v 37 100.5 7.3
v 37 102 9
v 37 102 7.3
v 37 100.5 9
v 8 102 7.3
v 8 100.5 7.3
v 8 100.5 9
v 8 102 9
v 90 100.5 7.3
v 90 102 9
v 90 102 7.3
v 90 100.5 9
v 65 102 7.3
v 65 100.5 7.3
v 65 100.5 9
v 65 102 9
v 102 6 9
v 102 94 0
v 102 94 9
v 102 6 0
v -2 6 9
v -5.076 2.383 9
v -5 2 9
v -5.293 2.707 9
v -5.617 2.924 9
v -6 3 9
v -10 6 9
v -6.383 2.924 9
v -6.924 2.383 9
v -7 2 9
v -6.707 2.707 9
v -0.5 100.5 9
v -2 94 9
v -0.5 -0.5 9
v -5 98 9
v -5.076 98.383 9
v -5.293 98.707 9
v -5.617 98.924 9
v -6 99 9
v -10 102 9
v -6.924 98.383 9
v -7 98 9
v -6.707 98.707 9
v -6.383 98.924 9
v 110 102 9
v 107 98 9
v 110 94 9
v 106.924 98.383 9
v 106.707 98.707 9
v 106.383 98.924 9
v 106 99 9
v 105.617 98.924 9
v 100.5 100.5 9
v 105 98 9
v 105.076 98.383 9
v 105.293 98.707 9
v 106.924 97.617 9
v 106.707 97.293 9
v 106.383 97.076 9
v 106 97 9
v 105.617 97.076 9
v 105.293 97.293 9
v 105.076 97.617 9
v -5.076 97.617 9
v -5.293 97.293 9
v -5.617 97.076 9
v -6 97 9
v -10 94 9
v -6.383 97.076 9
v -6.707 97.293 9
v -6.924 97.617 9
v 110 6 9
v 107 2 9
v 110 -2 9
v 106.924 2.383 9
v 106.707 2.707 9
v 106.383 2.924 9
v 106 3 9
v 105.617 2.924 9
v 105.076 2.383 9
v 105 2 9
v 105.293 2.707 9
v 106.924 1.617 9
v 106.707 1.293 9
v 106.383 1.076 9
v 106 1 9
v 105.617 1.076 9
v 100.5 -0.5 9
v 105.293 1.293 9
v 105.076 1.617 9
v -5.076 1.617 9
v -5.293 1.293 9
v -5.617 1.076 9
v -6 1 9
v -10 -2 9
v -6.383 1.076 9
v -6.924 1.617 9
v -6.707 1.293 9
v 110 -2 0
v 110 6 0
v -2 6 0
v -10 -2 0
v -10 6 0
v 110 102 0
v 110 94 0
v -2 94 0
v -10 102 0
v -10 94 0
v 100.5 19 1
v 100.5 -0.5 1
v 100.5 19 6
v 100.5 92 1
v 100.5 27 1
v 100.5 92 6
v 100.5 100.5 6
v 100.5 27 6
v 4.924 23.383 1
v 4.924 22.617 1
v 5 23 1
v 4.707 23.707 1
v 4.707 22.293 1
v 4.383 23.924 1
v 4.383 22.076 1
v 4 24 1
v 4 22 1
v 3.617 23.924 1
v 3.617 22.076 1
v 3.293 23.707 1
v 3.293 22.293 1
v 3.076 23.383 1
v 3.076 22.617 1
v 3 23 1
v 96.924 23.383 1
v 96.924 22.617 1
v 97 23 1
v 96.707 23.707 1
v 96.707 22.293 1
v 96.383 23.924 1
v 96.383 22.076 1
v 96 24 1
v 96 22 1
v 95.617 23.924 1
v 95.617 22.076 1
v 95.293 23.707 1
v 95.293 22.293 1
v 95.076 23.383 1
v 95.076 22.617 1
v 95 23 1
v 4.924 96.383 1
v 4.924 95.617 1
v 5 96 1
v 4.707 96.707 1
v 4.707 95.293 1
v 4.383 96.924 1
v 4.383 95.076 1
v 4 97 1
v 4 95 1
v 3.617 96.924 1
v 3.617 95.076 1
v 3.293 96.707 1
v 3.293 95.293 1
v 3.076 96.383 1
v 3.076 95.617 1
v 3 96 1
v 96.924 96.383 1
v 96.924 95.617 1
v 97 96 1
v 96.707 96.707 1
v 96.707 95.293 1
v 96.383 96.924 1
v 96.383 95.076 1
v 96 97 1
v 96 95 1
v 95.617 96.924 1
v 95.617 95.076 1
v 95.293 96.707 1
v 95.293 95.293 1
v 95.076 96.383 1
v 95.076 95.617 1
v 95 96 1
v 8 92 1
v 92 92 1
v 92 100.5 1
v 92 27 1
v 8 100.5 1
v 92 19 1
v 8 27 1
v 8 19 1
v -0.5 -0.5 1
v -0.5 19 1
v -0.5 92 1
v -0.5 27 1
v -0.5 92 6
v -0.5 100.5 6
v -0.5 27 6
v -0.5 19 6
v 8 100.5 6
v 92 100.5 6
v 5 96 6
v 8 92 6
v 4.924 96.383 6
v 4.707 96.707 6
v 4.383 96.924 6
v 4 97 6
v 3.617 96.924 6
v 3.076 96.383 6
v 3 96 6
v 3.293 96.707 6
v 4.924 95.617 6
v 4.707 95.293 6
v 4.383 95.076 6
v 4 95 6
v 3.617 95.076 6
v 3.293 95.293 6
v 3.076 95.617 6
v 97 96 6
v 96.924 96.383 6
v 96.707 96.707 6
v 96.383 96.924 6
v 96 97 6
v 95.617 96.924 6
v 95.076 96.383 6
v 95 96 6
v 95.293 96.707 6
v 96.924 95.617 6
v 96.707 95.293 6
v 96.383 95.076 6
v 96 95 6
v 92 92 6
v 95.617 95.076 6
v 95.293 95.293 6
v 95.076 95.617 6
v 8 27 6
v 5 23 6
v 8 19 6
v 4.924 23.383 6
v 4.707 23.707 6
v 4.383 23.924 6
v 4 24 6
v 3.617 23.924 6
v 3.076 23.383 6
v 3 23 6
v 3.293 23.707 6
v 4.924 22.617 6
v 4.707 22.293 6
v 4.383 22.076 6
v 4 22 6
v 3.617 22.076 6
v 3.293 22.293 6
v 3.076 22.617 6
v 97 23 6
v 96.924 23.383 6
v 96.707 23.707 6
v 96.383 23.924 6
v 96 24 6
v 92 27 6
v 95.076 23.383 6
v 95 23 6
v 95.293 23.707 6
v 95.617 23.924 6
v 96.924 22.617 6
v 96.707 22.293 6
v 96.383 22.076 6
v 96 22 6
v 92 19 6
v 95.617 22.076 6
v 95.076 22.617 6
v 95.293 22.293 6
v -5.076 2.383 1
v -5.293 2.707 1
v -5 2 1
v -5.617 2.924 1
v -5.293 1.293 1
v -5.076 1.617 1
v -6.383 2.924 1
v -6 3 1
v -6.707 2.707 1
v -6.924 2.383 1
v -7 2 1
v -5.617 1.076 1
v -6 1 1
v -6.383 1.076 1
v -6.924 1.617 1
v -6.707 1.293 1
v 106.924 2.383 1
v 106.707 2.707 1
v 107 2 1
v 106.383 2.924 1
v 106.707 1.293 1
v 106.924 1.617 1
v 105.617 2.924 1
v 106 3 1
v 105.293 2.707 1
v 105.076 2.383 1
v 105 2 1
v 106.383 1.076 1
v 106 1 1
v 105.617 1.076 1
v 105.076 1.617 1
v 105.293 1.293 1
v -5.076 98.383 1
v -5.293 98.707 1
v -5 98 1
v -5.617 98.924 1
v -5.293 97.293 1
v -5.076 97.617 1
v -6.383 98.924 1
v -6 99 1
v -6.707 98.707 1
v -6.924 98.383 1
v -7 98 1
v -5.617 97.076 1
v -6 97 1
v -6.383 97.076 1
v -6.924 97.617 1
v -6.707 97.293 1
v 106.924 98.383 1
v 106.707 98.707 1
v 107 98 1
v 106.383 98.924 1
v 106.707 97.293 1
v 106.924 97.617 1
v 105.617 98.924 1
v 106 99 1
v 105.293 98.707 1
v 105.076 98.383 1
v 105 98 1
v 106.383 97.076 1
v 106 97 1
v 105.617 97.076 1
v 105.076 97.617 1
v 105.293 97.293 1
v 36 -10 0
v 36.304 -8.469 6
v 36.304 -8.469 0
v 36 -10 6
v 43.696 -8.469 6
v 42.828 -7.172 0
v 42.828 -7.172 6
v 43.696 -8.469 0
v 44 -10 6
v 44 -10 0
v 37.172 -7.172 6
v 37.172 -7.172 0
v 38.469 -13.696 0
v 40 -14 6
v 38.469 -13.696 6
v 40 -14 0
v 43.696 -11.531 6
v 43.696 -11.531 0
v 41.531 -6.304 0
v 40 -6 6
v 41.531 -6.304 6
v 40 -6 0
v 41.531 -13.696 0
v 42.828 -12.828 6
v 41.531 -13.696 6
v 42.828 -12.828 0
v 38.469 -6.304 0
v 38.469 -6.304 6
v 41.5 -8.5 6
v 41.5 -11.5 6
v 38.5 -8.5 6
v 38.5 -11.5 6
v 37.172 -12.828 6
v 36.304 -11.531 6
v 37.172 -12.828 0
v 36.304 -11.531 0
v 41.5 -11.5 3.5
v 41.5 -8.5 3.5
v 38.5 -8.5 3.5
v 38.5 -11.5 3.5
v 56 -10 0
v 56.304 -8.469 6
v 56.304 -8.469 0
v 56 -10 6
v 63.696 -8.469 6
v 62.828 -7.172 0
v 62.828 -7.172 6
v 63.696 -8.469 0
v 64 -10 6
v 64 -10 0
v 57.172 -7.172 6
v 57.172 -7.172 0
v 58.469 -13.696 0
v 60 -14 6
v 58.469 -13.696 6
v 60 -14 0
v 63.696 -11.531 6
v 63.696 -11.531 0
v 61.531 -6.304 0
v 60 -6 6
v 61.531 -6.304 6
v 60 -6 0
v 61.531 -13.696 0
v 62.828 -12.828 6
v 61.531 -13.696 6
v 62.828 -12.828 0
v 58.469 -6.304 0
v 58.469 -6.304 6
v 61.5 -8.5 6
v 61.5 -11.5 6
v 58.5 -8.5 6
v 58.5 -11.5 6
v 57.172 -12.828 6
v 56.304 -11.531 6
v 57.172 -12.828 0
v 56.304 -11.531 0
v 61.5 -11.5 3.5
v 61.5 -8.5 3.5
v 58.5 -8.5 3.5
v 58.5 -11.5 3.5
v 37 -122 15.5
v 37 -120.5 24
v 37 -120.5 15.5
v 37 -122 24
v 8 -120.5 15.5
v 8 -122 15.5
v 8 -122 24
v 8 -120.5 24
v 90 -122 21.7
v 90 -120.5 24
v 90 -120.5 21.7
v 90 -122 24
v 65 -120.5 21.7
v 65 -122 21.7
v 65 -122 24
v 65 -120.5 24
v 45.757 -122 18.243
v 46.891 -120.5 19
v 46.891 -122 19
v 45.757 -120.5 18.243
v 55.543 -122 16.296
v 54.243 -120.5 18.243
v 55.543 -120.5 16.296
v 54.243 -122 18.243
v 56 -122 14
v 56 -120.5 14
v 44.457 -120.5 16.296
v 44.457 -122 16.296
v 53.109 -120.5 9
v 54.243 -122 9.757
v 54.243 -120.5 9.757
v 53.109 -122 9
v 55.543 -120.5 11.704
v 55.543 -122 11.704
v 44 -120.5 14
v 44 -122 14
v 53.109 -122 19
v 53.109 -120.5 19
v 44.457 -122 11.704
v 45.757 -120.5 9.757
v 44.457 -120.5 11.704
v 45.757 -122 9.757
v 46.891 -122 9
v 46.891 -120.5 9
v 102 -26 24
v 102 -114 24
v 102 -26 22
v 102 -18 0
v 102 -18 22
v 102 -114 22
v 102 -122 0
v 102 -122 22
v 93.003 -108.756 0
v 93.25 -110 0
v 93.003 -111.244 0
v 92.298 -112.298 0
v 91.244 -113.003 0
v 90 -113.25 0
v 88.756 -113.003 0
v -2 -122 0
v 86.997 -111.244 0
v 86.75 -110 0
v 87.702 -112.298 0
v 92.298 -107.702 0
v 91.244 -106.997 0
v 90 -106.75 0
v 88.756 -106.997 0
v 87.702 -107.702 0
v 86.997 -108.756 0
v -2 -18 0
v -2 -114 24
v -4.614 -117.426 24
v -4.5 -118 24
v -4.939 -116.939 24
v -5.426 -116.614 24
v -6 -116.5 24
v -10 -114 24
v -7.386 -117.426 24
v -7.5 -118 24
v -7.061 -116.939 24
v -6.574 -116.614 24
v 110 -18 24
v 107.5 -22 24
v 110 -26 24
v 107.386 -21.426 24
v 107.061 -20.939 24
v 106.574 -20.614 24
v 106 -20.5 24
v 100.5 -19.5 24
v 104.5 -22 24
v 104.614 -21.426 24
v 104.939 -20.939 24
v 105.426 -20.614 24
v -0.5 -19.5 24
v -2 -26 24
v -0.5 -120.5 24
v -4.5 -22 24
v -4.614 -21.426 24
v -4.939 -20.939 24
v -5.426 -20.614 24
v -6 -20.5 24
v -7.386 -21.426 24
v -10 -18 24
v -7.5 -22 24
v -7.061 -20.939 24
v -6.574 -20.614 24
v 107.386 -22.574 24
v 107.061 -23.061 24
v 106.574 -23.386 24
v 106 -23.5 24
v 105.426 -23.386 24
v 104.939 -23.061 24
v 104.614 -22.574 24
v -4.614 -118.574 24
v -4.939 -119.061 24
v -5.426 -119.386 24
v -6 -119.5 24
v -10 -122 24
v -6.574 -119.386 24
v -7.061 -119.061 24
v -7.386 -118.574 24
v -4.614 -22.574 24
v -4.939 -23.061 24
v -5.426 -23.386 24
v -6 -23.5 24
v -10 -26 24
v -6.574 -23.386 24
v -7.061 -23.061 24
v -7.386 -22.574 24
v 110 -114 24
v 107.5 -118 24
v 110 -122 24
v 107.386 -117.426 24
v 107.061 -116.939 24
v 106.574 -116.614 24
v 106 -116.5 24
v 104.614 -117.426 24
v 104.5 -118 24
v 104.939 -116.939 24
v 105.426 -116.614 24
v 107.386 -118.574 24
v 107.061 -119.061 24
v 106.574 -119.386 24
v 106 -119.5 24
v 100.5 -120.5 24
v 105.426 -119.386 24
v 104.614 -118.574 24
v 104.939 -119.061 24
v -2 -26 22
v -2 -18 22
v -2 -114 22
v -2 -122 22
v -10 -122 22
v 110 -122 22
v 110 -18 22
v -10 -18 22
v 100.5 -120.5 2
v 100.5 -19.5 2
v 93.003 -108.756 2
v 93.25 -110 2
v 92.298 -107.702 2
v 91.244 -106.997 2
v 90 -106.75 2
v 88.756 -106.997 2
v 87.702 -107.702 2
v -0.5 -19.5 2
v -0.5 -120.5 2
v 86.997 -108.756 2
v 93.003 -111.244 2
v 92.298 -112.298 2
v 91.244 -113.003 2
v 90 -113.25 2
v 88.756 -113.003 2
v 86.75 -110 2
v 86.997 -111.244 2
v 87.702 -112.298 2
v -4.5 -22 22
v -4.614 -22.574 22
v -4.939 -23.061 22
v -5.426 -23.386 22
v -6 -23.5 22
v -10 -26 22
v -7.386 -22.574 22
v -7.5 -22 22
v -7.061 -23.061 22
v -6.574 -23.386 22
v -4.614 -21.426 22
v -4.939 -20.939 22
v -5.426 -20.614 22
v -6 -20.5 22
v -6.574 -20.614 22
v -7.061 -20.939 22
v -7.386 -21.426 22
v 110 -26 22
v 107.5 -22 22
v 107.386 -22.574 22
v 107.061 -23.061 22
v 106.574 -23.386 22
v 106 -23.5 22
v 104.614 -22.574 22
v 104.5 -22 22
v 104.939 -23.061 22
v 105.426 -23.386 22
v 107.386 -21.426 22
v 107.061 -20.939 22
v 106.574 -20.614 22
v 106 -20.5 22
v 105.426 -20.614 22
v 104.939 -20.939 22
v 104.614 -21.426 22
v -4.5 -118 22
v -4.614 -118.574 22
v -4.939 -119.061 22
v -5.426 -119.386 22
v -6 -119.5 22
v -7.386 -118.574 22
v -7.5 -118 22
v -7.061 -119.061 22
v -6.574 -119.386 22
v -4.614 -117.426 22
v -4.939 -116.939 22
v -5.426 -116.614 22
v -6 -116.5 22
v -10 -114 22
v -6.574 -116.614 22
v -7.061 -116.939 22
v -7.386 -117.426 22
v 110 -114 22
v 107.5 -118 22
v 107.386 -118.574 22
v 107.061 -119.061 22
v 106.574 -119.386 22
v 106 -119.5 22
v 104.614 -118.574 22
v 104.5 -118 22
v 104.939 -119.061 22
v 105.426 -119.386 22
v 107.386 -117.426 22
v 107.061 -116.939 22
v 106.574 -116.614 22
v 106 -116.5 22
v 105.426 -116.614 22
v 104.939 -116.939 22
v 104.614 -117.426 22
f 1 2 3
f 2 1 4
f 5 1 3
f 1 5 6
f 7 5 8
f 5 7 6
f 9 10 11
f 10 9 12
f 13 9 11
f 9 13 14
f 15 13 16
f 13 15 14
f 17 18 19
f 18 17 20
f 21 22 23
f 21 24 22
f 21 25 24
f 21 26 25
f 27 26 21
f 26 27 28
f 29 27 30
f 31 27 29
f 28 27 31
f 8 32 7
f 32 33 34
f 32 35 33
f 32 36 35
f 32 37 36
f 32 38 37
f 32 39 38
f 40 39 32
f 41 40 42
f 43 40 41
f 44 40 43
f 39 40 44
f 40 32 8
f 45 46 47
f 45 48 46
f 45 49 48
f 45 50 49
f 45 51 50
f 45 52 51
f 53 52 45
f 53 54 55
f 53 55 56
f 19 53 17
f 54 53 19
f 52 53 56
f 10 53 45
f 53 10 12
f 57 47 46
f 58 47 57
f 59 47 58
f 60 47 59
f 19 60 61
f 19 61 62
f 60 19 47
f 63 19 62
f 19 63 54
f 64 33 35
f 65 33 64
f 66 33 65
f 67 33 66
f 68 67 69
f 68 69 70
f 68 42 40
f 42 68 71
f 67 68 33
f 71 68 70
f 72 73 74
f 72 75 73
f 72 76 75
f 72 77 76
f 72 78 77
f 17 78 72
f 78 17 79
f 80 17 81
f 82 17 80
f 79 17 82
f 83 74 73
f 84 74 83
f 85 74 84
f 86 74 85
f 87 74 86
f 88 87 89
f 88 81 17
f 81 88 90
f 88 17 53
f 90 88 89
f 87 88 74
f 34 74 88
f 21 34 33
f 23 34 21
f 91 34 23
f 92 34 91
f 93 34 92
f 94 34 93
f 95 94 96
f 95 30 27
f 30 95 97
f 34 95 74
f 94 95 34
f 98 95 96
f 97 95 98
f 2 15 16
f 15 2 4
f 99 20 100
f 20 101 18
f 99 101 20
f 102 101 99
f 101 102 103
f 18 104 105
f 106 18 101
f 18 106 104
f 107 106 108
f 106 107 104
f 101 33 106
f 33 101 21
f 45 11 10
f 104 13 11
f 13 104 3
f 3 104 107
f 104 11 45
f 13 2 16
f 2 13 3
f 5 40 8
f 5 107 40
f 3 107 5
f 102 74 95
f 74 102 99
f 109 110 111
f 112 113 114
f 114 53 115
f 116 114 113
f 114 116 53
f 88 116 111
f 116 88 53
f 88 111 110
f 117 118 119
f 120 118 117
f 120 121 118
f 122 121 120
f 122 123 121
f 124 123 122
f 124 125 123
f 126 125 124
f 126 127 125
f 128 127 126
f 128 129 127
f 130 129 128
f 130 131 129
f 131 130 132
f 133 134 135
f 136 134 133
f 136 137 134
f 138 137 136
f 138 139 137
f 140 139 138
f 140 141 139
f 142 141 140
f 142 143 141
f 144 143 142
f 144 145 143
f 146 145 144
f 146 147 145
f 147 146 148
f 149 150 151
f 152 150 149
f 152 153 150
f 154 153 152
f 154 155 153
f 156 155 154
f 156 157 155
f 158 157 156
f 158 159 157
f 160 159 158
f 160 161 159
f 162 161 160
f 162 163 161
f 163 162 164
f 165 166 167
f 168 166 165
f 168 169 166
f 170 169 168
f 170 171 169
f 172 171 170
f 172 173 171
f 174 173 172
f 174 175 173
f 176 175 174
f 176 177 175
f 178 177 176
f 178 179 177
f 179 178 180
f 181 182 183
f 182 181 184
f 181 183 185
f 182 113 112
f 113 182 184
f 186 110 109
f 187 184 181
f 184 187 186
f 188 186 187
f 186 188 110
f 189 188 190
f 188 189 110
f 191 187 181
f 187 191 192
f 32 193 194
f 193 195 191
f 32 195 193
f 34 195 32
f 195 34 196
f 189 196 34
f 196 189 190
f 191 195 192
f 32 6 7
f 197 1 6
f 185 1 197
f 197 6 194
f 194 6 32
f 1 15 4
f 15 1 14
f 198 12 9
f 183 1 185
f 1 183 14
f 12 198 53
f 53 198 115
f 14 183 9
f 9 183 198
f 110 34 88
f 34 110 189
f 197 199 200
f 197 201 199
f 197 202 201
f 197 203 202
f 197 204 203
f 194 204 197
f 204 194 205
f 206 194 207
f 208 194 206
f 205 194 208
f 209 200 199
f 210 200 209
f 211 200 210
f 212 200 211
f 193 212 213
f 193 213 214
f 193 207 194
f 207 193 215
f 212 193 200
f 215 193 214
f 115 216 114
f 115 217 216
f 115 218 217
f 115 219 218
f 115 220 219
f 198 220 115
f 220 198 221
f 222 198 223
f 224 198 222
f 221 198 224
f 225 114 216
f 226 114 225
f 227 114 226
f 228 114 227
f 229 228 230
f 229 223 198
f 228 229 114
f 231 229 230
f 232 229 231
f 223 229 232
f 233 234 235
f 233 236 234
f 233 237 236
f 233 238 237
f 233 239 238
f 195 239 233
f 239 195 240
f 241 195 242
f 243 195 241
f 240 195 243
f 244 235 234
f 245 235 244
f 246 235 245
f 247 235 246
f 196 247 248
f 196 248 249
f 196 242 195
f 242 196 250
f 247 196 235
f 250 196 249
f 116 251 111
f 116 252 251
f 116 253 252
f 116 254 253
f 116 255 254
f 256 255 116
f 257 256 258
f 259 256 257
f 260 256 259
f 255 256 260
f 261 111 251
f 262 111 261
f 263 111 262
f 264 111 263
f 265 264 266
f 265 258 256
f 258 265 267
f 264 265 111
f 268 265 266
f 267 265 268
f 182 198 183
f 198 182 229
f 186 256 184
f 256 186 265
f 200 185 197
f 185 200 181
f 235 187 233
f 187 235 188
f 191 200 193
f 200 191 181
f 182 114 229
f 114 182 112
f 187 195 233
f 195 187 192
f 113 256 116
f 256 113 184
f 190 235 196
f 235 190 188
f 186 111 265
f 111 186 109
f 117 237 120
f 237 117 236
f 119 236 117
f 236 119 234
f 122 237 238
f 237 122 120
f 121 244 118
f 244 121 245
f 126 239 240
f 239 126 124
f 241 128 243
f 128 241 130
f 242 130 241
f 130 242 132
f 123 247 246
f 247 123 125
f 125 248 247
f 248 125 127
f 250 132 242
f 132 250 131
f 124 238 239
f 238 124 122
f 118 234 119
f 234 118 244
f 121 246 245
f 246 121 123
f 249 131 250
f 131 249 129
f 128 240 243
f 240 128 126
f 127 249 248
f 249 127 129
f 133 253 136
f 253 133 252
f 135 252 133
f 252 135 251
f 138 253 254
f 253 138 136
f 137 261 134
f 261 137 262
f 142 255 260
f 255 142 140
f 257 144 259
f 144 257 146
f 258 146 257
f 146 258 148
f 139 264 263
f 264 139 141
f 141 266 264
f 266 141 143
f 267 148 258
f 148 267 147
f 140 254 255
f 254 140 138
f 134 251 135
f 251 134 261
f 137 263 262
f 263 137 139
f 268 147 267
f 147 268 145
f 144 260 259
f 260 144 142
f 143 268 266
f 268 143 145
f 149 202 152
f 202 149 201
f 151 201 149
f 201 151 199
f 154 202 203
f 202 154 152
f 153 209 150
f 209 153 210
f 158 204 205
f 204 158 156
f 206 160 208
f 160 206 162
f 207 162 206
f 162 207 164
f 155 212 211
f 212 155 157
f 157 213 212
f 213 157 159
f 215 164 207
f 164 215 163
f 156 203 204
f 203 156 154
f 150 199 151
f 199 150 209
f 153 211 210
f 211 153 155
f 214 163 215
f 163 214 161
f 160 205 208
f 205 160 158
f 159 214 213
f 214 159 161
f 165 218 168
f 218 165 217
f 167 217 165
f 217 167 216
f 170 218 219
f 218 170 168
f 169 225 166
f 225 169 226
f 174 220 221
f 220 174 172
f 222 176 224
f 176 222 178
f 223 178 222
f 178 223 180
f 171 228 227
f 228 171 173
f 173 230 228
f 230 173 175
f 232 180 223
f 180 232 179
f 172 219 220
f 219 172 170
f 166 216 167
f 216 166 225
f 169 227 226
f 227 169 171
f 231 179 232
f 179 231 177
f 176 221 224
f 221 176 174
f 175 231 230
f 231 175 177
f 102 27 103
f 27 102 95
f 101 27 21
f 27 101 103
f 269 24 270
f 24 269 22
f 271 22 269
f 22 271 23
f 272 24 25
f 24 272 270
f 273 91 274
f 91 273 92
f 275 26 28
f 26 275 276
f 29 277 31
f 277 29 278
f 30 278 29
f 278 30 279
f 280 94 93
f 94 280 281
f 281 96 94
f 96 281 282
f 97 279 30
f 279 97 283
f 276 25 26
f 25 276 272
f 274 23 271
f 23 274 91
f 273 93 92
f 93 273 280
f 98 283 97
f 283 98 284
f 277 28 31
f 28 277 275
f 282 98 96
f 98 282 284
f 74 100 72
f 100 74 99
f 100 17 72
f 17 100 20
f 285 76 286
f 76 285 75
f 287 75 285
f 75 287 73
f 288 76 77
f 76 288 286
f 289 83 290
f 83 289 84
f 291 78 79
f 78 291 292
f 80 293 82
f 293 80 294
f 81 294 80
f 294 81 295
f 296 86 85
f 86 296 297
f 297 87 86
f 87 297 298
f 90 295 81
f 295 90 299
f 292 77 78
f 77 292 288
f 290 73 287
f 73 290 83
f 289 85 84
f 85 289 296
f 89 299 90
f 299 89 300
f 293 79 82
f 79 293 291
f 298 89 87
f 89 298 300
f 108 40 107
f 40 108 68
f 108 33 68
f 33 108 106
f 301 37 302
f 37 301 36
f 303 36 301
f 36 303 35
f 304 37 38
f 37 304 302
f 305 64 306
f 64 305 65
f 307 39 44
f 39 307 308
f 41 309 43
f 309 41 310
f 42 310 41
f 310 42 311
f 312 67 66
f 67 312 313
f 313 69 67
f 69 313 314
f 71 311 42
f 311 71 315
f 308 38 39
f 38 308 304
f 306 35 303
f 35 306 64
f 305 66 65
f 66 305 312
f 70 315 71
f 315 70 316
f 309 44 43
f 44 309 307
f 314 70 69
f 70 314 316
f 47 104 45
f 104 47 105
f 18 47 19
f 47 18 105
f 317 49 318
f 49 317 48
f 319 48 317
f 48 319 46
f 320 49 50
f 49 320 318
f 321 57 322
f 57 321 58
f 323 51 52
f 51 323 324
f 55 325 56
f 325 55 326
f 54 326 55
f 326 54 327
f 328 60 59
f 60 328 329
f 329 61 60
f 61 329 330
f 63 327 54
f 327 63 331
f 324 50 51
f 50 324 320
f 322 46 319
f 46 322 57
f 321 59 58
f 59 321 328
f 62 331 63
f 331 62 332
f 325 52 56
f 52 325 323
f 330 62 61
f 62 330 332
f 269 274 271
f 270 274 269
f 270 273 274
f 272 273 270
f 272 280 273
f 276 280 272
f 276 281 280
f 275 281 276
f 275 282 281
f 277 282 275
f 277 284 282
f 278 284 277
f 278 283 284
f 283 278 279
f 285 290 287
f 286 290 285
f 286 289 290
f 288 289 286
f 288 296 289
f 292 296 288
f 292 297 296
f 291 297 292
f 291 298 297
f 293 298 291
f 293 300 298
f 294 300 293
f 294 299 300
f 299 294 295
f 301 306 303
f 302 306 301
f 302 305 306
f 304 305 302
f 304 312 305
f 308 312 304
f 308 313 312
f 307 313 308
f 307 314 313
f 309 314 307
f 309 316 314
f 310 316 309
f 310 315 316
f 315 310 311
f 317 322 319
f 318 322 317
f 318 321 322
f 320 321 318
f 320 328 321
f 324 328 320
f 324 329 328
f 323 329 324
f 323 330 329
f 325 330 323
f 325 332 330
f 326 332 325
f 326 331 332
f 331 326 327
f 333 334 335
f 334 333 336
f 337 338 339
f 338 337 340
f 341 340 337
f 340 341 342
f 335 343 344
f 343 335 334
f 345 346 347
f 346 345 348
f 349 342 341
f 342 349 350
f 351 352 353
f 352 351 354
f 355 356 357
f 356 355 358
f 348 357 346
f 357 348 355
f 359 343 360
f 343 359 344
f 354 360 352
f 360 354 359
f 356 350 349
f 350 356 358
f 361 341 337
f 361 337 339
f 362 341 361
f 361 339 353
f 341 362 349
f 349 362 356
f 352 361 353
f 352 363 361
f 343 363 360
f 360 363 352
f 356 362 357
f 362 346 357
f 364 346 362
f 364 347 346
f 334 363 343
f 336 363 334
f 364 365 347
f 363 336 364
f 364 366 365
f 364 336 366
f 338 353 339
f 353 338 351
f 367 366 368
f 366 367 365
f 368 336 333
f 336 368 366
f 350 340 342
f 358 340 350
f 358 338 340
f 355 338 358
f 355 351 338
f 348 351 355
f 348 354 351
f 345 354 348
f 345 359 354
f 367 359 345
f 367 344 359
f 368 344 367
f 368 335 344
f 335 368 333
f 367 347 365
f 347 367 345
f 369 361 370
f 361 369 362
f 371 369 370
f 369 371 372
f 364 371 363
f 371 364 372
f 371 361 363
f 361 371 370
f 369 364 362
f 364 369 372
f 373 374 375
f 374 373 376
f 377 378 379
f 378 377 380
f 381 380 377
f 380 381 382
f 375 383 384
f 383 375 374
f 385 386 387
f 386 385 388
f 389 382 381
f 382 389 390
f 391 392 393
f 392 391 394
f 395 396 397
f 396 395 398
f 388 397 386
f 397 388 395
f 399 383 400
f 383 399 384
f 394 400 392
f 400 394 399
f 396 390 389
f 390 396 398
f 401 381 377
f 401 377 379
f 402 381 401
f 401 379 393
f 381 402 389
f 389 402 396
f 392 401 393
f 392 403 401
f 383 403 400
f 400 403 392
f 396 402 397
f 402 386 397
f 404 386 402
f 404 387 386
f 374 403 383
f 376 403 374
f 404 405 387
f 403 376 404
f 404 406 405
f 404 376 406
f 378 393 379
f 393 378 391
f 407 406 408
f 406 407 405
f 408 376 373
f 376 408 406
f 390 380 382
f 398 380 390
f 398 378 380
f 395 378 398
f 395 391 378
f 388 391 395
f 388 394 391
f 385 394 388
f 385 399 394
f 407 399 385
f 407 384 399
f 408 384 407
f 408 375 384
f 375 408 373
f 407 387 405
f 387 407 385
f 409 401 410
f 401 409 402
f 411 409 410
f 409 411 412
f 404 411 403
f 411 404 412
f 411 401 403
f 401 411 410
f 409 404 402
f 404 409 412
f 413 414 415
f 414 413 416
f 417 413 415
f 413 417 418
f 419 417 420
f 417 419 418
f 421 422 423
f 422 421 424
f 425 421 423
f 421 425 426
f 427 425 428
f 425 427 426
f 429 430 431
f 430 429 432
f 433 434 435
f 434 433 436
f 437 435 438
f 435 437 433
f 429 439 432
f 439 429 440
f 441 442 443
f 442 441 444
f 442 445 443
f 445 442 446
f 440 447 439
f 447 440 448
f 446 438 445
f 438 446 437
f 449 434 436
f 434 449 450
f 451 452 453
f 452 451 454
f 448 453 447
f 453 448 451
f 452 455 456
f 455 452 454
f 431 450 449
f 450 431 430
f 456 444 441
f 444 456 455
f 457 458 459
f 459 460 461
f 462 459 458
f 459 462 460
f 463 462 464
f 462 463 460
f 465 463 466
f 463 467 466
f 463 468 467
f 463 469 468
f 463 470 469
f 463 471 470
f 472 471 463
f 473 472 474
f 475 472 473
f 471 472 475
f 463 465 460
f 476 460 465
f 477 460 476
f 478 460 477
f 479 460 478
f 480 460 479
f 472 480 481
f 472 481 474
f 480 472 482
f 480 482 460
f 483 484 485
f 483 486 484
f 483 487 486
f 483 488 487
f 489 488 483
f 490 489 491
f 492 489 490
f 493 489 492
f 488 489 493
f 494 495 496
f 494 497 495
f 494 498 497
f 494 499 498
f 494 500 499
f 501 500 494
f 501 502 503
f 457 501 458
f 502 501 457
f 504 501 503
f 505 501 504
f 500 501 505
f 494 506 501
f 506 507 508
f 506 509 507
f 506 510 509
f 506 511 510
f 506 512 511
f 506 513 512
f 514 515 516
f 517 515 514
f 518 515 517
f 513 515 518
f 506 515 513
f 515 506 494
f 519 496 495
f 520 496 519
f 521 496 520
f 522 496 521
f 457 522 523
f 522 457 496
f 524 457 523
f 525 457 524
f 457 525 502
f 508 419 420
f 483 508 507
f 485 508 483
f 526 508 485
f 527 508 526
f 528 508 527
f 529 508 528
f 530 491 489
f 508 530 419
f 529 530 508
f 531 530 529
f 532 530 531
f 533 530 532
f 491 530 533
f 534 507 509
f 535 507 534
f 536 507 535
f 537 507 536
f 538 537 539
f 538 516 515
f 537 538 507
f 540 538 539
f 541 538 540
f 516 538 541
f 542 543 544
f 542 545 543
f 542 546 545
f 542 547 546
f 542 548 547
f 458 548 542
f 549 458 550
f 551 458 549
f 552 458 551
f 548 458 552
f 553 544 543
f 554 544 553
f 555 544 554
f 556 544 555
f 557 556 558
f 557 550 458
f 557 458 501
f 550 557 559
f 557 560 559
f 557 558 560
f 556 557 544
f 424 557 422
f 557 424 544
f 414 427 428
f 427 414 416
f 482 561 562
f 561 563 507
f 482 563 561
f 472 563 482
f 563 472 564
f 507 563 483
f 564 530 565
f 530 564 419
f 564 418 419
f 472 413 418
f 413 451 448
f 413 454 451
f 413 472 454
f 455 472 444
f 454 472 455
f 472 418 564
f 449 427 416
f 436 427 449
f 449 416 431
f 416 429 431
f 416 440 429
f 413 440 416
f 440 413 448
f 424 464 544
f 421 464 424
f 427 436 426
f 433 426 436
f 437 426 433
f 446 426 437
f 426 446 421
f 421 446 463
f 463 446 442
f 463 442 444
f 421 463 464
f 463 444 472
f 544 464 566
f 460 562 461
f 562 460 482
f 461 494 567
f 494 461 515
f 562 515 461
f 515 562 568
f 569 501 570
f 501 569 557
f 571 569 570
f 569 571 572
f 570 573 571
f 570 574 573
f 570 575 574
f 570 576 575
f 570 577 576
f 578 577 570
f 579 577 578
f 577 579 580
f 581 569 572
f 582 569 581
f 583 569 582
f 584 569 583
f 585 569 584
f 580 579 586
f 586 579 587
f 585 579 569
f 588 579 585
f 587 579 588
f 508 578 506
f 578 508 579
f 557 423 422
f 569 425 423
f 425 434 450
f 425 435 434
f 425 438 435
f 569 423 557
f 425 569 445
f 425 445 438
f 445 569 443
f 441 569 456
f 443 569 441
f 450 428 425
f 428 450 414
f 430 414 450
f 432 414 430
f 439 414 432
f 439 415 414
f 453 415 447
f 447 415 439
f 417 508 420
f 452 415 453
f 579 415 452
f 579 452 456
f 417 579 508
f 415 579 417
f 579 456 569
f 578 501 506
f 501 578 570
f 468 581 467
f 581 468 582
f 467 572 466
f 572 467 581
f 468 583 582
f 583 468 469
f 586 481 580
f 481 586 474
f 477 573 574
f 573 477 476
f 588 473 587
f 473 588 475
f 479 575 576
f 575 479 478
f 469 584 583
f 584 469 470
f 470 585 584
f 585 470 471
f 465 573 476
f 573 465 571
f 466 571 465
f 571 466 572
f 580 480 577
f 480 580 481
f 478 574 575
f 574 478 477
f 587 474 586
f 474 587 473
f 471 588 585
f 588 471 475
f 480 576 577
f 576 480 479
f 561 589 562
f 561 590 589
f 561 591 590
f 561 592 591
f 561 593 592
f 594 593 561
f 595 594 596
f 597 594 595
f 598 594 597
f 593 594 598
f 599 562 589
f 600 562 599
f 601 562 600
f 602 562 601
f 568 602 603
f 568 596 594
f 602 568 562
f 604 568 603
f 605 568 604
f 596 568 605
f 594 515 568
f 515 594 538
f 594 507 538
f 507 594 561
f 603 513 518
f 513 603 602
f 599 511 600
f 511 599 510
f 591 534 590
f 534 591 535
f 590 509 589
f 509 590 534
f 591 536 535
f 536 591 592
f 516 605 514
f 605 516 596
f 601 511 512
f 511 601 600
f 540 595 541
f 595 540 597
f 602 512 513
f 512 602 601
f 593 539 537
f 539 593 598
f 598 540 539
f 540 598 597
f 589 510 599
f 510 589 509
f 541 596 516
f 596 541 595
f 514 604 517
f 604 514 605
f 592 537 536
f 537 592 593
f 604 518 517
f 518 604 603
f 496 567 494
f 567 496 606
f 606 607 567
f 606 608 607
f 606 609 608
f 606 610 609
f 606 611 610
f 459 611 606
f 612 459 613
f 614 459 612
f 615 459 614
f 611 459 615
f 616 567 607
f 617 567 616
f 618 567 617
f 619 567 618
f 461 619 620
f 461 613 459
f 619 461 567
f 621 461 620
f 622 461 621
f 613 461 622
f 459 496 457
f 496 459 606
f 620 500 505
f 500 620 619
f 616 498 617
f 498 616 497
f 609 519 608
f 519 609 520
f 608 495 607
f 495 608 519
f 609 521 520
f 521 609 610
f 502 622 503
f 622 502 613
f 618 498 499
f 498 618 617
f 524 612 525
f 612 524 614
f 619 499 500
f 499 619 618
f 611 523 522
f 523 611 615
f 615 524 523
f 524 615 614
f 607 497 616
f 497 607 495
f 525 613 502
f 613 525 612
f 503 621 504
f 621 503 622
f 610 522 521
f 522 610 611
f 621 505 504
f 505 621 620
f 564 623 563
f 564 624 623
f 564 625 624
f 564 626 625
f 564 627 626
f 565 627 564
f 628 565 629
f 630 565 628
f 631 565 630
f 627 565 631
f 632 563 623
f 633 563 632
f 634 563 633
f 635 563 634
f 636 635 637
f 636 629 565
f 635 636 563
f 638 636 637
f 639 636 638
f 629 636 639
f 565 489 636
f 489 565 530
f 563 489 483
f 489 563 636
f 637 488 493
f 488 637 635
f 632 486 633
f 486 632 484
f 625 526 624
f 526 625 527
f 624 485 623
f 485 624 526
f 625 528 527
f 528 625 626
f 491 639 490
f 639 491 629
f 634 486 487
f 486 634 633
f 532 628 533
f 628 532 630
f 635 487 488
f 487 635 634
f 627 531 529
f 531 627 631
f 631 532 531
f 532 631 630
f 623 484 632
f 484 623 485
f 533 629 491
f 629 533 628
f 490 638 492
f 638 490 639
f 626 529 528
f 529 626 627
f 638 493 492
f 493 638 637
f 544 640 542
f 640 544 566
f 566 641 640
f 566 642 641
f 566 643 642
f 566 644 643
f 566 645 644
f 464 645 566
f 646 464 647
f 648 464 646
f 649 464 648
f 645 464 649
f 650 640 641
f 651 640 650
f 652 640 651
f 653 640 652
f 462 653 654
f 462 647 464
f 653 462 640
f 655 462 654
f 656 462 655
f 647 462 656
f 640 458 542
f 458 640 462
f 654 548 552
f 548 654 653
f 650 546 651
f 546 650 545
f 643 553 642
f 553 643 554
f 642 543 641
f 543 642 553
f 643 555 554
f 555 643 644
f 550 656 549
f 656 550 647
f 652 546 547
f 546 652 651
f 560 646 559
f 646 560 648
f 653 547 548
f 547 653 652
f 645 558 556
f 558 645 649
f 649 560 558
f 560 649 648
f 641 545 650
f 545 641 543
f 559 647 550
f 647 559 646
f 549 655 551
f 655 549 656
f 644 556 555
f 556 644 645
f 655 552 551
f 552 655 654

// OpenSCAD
// RPG Unify Box
// Jack Shaver
// 3-15-2025

module pcbKeepout(){
    difference(){
        translate([0,0,0])cube([100,100,1.6]); // pcb
        
        translate([4,23,-6])cylinder(d=2.5, h=10, $fn=16); // holes
        translate([96,23,-6])cylinder(d=2.5, h=10, $fn=16);
        translate([4,96,-6])cylinder(d=2.5, h=10, $fn=16);
        translate([96,96,-6])cylinder(d=2.5, h=10, $fn=16);
    }
    
    //translate([7,-3,1.6])cube([86,21,29]); // rear connectors
    
    
    //translate([17.9,93,1.3])cube([9.6,10,10.2]); // leds
    //translate([13.2,93,6.5])rotate([-90,0,0])cylinder(d=8,h=10,$fn=16); // power button
    //translate([32,93,6.5])rotate([-90,0,0])cylinder(d=8,h=10,$fn=16); // fire button
    
    translate([8,93,1.3])cube([29,10,10.2]);
    
    
    translate([29.4,93,1.6])cube([5.2,10,5]);// fire button
    translate([10.6,93,1.6])cube([5.2,10,5]);// fire button
    
    //translate([65.25,93,1.3])cube([9.5,10,3.8]); // type c
    //translate([78,93,1.6])cube([12,10,2.5]); // micro sd
    translate([65,93,1.3])cube([25,10,4]); // type c and micro sd

}

module lidMount(height, holeDiameter){
    difference(){
        cube([8,8,height]);
        translate([4,4,0])cylinder(d=holeDiameter,h=10,$fn=16);
    }
}

module keyHole(){
    difference(){
        rotate([-90,0,0])cylinder(d=12,h=6,$fn=16);
        translate([-15,0,-6])cube([30,10,1]);
        translate([-15,0,5])cube([30,10,1]);
    }
}   

module lid(){
    difference(){
        translate([-2,-2,0])cube([104,104,24]);
        translate([-0.5,-0.5,0])cube([101,101,22]);
        translate([0,0,-3])pcbKeepout();
        translate([50,98,10])keyHole();
        translate([90,90,0])cylinder(d=6.5,h=50,$fn=16);
    }
    
    translate([-10,-2,0])lidMount(2,3);
    translate([102,-2,0])lidMount(2,3);
    translate([-10,94,0])lidMount(2,3);
    translate([102,94,0])lidMount(2,3);
}

module enclosure(){
    difference(){
        translate([-2,-2,0])cube([104,104,9]);
        translate([0,0,6])pcbKeepout();
        translate([-0.5,-0.5,1])cube([101,101,10]);
        translate([4,23,1])cylinder(d=2, h=10, $fn=16); // holes
        translate([96,23,1])cylinder(d=2, h=10, $fn=16);
        translate([4,96,1])cylinder(d=2, h=10, $fn=16);
        translate([96,96,1])cylinder(d=2, h=10, $fn=16);
    }
    
    difference(){
       translate([-2,-2,0])cube([104,104,6]);
       translate([8,-2,0])cube([84,120,12]);
       translate([-2,27,0])cube([120,65,12]); 
       translate([-2,-2,0])cube([120,21,12]); 
        
       translate([4,23,1])cylinder(d=2, h=10, $fn=16); // holes
       translate([96,23,1])cylinder(d=2, h=10, $fn=16);
       translate([4,96,1])cylinder(d=2, h=10, $fn=16);
       translate([96,96,1])cylinder(d=2, h=10, $fn=16);
       //translate([0,0,6])pcbKeepout();
    }
    
    translate([-10,-2,0])lidMount(9,2);
    translate([102,-2,0])lidMount(9,2);
    translate([-10,94,0])lidMount(9,2);
    translate([102,94,0])lidMount(9,2);
    
    translate([-10,-2,0])cube([8,8,1]);
    translate([102,-2,0])cube([8,8,1]);
    translate([-10,94,0])cube([8,8,1]);
    translate([102,94,0])cube([8,8,1]);
    
}

module button(){
    difference(){
        cylinder(d=8,h=6,$fn=16);
        translate([-1.5,-1.5,3.5])cube([3,3,3]);
    }
}

module display(){
    //pcbKeepout();
    enclosure();
    //lid();
    //keyHole();
    translate([40,-10,0])button();
    translate([60,-10,0])button();
    translate([0,-20,24])rotate([180,0,0])lid();
}

display();
